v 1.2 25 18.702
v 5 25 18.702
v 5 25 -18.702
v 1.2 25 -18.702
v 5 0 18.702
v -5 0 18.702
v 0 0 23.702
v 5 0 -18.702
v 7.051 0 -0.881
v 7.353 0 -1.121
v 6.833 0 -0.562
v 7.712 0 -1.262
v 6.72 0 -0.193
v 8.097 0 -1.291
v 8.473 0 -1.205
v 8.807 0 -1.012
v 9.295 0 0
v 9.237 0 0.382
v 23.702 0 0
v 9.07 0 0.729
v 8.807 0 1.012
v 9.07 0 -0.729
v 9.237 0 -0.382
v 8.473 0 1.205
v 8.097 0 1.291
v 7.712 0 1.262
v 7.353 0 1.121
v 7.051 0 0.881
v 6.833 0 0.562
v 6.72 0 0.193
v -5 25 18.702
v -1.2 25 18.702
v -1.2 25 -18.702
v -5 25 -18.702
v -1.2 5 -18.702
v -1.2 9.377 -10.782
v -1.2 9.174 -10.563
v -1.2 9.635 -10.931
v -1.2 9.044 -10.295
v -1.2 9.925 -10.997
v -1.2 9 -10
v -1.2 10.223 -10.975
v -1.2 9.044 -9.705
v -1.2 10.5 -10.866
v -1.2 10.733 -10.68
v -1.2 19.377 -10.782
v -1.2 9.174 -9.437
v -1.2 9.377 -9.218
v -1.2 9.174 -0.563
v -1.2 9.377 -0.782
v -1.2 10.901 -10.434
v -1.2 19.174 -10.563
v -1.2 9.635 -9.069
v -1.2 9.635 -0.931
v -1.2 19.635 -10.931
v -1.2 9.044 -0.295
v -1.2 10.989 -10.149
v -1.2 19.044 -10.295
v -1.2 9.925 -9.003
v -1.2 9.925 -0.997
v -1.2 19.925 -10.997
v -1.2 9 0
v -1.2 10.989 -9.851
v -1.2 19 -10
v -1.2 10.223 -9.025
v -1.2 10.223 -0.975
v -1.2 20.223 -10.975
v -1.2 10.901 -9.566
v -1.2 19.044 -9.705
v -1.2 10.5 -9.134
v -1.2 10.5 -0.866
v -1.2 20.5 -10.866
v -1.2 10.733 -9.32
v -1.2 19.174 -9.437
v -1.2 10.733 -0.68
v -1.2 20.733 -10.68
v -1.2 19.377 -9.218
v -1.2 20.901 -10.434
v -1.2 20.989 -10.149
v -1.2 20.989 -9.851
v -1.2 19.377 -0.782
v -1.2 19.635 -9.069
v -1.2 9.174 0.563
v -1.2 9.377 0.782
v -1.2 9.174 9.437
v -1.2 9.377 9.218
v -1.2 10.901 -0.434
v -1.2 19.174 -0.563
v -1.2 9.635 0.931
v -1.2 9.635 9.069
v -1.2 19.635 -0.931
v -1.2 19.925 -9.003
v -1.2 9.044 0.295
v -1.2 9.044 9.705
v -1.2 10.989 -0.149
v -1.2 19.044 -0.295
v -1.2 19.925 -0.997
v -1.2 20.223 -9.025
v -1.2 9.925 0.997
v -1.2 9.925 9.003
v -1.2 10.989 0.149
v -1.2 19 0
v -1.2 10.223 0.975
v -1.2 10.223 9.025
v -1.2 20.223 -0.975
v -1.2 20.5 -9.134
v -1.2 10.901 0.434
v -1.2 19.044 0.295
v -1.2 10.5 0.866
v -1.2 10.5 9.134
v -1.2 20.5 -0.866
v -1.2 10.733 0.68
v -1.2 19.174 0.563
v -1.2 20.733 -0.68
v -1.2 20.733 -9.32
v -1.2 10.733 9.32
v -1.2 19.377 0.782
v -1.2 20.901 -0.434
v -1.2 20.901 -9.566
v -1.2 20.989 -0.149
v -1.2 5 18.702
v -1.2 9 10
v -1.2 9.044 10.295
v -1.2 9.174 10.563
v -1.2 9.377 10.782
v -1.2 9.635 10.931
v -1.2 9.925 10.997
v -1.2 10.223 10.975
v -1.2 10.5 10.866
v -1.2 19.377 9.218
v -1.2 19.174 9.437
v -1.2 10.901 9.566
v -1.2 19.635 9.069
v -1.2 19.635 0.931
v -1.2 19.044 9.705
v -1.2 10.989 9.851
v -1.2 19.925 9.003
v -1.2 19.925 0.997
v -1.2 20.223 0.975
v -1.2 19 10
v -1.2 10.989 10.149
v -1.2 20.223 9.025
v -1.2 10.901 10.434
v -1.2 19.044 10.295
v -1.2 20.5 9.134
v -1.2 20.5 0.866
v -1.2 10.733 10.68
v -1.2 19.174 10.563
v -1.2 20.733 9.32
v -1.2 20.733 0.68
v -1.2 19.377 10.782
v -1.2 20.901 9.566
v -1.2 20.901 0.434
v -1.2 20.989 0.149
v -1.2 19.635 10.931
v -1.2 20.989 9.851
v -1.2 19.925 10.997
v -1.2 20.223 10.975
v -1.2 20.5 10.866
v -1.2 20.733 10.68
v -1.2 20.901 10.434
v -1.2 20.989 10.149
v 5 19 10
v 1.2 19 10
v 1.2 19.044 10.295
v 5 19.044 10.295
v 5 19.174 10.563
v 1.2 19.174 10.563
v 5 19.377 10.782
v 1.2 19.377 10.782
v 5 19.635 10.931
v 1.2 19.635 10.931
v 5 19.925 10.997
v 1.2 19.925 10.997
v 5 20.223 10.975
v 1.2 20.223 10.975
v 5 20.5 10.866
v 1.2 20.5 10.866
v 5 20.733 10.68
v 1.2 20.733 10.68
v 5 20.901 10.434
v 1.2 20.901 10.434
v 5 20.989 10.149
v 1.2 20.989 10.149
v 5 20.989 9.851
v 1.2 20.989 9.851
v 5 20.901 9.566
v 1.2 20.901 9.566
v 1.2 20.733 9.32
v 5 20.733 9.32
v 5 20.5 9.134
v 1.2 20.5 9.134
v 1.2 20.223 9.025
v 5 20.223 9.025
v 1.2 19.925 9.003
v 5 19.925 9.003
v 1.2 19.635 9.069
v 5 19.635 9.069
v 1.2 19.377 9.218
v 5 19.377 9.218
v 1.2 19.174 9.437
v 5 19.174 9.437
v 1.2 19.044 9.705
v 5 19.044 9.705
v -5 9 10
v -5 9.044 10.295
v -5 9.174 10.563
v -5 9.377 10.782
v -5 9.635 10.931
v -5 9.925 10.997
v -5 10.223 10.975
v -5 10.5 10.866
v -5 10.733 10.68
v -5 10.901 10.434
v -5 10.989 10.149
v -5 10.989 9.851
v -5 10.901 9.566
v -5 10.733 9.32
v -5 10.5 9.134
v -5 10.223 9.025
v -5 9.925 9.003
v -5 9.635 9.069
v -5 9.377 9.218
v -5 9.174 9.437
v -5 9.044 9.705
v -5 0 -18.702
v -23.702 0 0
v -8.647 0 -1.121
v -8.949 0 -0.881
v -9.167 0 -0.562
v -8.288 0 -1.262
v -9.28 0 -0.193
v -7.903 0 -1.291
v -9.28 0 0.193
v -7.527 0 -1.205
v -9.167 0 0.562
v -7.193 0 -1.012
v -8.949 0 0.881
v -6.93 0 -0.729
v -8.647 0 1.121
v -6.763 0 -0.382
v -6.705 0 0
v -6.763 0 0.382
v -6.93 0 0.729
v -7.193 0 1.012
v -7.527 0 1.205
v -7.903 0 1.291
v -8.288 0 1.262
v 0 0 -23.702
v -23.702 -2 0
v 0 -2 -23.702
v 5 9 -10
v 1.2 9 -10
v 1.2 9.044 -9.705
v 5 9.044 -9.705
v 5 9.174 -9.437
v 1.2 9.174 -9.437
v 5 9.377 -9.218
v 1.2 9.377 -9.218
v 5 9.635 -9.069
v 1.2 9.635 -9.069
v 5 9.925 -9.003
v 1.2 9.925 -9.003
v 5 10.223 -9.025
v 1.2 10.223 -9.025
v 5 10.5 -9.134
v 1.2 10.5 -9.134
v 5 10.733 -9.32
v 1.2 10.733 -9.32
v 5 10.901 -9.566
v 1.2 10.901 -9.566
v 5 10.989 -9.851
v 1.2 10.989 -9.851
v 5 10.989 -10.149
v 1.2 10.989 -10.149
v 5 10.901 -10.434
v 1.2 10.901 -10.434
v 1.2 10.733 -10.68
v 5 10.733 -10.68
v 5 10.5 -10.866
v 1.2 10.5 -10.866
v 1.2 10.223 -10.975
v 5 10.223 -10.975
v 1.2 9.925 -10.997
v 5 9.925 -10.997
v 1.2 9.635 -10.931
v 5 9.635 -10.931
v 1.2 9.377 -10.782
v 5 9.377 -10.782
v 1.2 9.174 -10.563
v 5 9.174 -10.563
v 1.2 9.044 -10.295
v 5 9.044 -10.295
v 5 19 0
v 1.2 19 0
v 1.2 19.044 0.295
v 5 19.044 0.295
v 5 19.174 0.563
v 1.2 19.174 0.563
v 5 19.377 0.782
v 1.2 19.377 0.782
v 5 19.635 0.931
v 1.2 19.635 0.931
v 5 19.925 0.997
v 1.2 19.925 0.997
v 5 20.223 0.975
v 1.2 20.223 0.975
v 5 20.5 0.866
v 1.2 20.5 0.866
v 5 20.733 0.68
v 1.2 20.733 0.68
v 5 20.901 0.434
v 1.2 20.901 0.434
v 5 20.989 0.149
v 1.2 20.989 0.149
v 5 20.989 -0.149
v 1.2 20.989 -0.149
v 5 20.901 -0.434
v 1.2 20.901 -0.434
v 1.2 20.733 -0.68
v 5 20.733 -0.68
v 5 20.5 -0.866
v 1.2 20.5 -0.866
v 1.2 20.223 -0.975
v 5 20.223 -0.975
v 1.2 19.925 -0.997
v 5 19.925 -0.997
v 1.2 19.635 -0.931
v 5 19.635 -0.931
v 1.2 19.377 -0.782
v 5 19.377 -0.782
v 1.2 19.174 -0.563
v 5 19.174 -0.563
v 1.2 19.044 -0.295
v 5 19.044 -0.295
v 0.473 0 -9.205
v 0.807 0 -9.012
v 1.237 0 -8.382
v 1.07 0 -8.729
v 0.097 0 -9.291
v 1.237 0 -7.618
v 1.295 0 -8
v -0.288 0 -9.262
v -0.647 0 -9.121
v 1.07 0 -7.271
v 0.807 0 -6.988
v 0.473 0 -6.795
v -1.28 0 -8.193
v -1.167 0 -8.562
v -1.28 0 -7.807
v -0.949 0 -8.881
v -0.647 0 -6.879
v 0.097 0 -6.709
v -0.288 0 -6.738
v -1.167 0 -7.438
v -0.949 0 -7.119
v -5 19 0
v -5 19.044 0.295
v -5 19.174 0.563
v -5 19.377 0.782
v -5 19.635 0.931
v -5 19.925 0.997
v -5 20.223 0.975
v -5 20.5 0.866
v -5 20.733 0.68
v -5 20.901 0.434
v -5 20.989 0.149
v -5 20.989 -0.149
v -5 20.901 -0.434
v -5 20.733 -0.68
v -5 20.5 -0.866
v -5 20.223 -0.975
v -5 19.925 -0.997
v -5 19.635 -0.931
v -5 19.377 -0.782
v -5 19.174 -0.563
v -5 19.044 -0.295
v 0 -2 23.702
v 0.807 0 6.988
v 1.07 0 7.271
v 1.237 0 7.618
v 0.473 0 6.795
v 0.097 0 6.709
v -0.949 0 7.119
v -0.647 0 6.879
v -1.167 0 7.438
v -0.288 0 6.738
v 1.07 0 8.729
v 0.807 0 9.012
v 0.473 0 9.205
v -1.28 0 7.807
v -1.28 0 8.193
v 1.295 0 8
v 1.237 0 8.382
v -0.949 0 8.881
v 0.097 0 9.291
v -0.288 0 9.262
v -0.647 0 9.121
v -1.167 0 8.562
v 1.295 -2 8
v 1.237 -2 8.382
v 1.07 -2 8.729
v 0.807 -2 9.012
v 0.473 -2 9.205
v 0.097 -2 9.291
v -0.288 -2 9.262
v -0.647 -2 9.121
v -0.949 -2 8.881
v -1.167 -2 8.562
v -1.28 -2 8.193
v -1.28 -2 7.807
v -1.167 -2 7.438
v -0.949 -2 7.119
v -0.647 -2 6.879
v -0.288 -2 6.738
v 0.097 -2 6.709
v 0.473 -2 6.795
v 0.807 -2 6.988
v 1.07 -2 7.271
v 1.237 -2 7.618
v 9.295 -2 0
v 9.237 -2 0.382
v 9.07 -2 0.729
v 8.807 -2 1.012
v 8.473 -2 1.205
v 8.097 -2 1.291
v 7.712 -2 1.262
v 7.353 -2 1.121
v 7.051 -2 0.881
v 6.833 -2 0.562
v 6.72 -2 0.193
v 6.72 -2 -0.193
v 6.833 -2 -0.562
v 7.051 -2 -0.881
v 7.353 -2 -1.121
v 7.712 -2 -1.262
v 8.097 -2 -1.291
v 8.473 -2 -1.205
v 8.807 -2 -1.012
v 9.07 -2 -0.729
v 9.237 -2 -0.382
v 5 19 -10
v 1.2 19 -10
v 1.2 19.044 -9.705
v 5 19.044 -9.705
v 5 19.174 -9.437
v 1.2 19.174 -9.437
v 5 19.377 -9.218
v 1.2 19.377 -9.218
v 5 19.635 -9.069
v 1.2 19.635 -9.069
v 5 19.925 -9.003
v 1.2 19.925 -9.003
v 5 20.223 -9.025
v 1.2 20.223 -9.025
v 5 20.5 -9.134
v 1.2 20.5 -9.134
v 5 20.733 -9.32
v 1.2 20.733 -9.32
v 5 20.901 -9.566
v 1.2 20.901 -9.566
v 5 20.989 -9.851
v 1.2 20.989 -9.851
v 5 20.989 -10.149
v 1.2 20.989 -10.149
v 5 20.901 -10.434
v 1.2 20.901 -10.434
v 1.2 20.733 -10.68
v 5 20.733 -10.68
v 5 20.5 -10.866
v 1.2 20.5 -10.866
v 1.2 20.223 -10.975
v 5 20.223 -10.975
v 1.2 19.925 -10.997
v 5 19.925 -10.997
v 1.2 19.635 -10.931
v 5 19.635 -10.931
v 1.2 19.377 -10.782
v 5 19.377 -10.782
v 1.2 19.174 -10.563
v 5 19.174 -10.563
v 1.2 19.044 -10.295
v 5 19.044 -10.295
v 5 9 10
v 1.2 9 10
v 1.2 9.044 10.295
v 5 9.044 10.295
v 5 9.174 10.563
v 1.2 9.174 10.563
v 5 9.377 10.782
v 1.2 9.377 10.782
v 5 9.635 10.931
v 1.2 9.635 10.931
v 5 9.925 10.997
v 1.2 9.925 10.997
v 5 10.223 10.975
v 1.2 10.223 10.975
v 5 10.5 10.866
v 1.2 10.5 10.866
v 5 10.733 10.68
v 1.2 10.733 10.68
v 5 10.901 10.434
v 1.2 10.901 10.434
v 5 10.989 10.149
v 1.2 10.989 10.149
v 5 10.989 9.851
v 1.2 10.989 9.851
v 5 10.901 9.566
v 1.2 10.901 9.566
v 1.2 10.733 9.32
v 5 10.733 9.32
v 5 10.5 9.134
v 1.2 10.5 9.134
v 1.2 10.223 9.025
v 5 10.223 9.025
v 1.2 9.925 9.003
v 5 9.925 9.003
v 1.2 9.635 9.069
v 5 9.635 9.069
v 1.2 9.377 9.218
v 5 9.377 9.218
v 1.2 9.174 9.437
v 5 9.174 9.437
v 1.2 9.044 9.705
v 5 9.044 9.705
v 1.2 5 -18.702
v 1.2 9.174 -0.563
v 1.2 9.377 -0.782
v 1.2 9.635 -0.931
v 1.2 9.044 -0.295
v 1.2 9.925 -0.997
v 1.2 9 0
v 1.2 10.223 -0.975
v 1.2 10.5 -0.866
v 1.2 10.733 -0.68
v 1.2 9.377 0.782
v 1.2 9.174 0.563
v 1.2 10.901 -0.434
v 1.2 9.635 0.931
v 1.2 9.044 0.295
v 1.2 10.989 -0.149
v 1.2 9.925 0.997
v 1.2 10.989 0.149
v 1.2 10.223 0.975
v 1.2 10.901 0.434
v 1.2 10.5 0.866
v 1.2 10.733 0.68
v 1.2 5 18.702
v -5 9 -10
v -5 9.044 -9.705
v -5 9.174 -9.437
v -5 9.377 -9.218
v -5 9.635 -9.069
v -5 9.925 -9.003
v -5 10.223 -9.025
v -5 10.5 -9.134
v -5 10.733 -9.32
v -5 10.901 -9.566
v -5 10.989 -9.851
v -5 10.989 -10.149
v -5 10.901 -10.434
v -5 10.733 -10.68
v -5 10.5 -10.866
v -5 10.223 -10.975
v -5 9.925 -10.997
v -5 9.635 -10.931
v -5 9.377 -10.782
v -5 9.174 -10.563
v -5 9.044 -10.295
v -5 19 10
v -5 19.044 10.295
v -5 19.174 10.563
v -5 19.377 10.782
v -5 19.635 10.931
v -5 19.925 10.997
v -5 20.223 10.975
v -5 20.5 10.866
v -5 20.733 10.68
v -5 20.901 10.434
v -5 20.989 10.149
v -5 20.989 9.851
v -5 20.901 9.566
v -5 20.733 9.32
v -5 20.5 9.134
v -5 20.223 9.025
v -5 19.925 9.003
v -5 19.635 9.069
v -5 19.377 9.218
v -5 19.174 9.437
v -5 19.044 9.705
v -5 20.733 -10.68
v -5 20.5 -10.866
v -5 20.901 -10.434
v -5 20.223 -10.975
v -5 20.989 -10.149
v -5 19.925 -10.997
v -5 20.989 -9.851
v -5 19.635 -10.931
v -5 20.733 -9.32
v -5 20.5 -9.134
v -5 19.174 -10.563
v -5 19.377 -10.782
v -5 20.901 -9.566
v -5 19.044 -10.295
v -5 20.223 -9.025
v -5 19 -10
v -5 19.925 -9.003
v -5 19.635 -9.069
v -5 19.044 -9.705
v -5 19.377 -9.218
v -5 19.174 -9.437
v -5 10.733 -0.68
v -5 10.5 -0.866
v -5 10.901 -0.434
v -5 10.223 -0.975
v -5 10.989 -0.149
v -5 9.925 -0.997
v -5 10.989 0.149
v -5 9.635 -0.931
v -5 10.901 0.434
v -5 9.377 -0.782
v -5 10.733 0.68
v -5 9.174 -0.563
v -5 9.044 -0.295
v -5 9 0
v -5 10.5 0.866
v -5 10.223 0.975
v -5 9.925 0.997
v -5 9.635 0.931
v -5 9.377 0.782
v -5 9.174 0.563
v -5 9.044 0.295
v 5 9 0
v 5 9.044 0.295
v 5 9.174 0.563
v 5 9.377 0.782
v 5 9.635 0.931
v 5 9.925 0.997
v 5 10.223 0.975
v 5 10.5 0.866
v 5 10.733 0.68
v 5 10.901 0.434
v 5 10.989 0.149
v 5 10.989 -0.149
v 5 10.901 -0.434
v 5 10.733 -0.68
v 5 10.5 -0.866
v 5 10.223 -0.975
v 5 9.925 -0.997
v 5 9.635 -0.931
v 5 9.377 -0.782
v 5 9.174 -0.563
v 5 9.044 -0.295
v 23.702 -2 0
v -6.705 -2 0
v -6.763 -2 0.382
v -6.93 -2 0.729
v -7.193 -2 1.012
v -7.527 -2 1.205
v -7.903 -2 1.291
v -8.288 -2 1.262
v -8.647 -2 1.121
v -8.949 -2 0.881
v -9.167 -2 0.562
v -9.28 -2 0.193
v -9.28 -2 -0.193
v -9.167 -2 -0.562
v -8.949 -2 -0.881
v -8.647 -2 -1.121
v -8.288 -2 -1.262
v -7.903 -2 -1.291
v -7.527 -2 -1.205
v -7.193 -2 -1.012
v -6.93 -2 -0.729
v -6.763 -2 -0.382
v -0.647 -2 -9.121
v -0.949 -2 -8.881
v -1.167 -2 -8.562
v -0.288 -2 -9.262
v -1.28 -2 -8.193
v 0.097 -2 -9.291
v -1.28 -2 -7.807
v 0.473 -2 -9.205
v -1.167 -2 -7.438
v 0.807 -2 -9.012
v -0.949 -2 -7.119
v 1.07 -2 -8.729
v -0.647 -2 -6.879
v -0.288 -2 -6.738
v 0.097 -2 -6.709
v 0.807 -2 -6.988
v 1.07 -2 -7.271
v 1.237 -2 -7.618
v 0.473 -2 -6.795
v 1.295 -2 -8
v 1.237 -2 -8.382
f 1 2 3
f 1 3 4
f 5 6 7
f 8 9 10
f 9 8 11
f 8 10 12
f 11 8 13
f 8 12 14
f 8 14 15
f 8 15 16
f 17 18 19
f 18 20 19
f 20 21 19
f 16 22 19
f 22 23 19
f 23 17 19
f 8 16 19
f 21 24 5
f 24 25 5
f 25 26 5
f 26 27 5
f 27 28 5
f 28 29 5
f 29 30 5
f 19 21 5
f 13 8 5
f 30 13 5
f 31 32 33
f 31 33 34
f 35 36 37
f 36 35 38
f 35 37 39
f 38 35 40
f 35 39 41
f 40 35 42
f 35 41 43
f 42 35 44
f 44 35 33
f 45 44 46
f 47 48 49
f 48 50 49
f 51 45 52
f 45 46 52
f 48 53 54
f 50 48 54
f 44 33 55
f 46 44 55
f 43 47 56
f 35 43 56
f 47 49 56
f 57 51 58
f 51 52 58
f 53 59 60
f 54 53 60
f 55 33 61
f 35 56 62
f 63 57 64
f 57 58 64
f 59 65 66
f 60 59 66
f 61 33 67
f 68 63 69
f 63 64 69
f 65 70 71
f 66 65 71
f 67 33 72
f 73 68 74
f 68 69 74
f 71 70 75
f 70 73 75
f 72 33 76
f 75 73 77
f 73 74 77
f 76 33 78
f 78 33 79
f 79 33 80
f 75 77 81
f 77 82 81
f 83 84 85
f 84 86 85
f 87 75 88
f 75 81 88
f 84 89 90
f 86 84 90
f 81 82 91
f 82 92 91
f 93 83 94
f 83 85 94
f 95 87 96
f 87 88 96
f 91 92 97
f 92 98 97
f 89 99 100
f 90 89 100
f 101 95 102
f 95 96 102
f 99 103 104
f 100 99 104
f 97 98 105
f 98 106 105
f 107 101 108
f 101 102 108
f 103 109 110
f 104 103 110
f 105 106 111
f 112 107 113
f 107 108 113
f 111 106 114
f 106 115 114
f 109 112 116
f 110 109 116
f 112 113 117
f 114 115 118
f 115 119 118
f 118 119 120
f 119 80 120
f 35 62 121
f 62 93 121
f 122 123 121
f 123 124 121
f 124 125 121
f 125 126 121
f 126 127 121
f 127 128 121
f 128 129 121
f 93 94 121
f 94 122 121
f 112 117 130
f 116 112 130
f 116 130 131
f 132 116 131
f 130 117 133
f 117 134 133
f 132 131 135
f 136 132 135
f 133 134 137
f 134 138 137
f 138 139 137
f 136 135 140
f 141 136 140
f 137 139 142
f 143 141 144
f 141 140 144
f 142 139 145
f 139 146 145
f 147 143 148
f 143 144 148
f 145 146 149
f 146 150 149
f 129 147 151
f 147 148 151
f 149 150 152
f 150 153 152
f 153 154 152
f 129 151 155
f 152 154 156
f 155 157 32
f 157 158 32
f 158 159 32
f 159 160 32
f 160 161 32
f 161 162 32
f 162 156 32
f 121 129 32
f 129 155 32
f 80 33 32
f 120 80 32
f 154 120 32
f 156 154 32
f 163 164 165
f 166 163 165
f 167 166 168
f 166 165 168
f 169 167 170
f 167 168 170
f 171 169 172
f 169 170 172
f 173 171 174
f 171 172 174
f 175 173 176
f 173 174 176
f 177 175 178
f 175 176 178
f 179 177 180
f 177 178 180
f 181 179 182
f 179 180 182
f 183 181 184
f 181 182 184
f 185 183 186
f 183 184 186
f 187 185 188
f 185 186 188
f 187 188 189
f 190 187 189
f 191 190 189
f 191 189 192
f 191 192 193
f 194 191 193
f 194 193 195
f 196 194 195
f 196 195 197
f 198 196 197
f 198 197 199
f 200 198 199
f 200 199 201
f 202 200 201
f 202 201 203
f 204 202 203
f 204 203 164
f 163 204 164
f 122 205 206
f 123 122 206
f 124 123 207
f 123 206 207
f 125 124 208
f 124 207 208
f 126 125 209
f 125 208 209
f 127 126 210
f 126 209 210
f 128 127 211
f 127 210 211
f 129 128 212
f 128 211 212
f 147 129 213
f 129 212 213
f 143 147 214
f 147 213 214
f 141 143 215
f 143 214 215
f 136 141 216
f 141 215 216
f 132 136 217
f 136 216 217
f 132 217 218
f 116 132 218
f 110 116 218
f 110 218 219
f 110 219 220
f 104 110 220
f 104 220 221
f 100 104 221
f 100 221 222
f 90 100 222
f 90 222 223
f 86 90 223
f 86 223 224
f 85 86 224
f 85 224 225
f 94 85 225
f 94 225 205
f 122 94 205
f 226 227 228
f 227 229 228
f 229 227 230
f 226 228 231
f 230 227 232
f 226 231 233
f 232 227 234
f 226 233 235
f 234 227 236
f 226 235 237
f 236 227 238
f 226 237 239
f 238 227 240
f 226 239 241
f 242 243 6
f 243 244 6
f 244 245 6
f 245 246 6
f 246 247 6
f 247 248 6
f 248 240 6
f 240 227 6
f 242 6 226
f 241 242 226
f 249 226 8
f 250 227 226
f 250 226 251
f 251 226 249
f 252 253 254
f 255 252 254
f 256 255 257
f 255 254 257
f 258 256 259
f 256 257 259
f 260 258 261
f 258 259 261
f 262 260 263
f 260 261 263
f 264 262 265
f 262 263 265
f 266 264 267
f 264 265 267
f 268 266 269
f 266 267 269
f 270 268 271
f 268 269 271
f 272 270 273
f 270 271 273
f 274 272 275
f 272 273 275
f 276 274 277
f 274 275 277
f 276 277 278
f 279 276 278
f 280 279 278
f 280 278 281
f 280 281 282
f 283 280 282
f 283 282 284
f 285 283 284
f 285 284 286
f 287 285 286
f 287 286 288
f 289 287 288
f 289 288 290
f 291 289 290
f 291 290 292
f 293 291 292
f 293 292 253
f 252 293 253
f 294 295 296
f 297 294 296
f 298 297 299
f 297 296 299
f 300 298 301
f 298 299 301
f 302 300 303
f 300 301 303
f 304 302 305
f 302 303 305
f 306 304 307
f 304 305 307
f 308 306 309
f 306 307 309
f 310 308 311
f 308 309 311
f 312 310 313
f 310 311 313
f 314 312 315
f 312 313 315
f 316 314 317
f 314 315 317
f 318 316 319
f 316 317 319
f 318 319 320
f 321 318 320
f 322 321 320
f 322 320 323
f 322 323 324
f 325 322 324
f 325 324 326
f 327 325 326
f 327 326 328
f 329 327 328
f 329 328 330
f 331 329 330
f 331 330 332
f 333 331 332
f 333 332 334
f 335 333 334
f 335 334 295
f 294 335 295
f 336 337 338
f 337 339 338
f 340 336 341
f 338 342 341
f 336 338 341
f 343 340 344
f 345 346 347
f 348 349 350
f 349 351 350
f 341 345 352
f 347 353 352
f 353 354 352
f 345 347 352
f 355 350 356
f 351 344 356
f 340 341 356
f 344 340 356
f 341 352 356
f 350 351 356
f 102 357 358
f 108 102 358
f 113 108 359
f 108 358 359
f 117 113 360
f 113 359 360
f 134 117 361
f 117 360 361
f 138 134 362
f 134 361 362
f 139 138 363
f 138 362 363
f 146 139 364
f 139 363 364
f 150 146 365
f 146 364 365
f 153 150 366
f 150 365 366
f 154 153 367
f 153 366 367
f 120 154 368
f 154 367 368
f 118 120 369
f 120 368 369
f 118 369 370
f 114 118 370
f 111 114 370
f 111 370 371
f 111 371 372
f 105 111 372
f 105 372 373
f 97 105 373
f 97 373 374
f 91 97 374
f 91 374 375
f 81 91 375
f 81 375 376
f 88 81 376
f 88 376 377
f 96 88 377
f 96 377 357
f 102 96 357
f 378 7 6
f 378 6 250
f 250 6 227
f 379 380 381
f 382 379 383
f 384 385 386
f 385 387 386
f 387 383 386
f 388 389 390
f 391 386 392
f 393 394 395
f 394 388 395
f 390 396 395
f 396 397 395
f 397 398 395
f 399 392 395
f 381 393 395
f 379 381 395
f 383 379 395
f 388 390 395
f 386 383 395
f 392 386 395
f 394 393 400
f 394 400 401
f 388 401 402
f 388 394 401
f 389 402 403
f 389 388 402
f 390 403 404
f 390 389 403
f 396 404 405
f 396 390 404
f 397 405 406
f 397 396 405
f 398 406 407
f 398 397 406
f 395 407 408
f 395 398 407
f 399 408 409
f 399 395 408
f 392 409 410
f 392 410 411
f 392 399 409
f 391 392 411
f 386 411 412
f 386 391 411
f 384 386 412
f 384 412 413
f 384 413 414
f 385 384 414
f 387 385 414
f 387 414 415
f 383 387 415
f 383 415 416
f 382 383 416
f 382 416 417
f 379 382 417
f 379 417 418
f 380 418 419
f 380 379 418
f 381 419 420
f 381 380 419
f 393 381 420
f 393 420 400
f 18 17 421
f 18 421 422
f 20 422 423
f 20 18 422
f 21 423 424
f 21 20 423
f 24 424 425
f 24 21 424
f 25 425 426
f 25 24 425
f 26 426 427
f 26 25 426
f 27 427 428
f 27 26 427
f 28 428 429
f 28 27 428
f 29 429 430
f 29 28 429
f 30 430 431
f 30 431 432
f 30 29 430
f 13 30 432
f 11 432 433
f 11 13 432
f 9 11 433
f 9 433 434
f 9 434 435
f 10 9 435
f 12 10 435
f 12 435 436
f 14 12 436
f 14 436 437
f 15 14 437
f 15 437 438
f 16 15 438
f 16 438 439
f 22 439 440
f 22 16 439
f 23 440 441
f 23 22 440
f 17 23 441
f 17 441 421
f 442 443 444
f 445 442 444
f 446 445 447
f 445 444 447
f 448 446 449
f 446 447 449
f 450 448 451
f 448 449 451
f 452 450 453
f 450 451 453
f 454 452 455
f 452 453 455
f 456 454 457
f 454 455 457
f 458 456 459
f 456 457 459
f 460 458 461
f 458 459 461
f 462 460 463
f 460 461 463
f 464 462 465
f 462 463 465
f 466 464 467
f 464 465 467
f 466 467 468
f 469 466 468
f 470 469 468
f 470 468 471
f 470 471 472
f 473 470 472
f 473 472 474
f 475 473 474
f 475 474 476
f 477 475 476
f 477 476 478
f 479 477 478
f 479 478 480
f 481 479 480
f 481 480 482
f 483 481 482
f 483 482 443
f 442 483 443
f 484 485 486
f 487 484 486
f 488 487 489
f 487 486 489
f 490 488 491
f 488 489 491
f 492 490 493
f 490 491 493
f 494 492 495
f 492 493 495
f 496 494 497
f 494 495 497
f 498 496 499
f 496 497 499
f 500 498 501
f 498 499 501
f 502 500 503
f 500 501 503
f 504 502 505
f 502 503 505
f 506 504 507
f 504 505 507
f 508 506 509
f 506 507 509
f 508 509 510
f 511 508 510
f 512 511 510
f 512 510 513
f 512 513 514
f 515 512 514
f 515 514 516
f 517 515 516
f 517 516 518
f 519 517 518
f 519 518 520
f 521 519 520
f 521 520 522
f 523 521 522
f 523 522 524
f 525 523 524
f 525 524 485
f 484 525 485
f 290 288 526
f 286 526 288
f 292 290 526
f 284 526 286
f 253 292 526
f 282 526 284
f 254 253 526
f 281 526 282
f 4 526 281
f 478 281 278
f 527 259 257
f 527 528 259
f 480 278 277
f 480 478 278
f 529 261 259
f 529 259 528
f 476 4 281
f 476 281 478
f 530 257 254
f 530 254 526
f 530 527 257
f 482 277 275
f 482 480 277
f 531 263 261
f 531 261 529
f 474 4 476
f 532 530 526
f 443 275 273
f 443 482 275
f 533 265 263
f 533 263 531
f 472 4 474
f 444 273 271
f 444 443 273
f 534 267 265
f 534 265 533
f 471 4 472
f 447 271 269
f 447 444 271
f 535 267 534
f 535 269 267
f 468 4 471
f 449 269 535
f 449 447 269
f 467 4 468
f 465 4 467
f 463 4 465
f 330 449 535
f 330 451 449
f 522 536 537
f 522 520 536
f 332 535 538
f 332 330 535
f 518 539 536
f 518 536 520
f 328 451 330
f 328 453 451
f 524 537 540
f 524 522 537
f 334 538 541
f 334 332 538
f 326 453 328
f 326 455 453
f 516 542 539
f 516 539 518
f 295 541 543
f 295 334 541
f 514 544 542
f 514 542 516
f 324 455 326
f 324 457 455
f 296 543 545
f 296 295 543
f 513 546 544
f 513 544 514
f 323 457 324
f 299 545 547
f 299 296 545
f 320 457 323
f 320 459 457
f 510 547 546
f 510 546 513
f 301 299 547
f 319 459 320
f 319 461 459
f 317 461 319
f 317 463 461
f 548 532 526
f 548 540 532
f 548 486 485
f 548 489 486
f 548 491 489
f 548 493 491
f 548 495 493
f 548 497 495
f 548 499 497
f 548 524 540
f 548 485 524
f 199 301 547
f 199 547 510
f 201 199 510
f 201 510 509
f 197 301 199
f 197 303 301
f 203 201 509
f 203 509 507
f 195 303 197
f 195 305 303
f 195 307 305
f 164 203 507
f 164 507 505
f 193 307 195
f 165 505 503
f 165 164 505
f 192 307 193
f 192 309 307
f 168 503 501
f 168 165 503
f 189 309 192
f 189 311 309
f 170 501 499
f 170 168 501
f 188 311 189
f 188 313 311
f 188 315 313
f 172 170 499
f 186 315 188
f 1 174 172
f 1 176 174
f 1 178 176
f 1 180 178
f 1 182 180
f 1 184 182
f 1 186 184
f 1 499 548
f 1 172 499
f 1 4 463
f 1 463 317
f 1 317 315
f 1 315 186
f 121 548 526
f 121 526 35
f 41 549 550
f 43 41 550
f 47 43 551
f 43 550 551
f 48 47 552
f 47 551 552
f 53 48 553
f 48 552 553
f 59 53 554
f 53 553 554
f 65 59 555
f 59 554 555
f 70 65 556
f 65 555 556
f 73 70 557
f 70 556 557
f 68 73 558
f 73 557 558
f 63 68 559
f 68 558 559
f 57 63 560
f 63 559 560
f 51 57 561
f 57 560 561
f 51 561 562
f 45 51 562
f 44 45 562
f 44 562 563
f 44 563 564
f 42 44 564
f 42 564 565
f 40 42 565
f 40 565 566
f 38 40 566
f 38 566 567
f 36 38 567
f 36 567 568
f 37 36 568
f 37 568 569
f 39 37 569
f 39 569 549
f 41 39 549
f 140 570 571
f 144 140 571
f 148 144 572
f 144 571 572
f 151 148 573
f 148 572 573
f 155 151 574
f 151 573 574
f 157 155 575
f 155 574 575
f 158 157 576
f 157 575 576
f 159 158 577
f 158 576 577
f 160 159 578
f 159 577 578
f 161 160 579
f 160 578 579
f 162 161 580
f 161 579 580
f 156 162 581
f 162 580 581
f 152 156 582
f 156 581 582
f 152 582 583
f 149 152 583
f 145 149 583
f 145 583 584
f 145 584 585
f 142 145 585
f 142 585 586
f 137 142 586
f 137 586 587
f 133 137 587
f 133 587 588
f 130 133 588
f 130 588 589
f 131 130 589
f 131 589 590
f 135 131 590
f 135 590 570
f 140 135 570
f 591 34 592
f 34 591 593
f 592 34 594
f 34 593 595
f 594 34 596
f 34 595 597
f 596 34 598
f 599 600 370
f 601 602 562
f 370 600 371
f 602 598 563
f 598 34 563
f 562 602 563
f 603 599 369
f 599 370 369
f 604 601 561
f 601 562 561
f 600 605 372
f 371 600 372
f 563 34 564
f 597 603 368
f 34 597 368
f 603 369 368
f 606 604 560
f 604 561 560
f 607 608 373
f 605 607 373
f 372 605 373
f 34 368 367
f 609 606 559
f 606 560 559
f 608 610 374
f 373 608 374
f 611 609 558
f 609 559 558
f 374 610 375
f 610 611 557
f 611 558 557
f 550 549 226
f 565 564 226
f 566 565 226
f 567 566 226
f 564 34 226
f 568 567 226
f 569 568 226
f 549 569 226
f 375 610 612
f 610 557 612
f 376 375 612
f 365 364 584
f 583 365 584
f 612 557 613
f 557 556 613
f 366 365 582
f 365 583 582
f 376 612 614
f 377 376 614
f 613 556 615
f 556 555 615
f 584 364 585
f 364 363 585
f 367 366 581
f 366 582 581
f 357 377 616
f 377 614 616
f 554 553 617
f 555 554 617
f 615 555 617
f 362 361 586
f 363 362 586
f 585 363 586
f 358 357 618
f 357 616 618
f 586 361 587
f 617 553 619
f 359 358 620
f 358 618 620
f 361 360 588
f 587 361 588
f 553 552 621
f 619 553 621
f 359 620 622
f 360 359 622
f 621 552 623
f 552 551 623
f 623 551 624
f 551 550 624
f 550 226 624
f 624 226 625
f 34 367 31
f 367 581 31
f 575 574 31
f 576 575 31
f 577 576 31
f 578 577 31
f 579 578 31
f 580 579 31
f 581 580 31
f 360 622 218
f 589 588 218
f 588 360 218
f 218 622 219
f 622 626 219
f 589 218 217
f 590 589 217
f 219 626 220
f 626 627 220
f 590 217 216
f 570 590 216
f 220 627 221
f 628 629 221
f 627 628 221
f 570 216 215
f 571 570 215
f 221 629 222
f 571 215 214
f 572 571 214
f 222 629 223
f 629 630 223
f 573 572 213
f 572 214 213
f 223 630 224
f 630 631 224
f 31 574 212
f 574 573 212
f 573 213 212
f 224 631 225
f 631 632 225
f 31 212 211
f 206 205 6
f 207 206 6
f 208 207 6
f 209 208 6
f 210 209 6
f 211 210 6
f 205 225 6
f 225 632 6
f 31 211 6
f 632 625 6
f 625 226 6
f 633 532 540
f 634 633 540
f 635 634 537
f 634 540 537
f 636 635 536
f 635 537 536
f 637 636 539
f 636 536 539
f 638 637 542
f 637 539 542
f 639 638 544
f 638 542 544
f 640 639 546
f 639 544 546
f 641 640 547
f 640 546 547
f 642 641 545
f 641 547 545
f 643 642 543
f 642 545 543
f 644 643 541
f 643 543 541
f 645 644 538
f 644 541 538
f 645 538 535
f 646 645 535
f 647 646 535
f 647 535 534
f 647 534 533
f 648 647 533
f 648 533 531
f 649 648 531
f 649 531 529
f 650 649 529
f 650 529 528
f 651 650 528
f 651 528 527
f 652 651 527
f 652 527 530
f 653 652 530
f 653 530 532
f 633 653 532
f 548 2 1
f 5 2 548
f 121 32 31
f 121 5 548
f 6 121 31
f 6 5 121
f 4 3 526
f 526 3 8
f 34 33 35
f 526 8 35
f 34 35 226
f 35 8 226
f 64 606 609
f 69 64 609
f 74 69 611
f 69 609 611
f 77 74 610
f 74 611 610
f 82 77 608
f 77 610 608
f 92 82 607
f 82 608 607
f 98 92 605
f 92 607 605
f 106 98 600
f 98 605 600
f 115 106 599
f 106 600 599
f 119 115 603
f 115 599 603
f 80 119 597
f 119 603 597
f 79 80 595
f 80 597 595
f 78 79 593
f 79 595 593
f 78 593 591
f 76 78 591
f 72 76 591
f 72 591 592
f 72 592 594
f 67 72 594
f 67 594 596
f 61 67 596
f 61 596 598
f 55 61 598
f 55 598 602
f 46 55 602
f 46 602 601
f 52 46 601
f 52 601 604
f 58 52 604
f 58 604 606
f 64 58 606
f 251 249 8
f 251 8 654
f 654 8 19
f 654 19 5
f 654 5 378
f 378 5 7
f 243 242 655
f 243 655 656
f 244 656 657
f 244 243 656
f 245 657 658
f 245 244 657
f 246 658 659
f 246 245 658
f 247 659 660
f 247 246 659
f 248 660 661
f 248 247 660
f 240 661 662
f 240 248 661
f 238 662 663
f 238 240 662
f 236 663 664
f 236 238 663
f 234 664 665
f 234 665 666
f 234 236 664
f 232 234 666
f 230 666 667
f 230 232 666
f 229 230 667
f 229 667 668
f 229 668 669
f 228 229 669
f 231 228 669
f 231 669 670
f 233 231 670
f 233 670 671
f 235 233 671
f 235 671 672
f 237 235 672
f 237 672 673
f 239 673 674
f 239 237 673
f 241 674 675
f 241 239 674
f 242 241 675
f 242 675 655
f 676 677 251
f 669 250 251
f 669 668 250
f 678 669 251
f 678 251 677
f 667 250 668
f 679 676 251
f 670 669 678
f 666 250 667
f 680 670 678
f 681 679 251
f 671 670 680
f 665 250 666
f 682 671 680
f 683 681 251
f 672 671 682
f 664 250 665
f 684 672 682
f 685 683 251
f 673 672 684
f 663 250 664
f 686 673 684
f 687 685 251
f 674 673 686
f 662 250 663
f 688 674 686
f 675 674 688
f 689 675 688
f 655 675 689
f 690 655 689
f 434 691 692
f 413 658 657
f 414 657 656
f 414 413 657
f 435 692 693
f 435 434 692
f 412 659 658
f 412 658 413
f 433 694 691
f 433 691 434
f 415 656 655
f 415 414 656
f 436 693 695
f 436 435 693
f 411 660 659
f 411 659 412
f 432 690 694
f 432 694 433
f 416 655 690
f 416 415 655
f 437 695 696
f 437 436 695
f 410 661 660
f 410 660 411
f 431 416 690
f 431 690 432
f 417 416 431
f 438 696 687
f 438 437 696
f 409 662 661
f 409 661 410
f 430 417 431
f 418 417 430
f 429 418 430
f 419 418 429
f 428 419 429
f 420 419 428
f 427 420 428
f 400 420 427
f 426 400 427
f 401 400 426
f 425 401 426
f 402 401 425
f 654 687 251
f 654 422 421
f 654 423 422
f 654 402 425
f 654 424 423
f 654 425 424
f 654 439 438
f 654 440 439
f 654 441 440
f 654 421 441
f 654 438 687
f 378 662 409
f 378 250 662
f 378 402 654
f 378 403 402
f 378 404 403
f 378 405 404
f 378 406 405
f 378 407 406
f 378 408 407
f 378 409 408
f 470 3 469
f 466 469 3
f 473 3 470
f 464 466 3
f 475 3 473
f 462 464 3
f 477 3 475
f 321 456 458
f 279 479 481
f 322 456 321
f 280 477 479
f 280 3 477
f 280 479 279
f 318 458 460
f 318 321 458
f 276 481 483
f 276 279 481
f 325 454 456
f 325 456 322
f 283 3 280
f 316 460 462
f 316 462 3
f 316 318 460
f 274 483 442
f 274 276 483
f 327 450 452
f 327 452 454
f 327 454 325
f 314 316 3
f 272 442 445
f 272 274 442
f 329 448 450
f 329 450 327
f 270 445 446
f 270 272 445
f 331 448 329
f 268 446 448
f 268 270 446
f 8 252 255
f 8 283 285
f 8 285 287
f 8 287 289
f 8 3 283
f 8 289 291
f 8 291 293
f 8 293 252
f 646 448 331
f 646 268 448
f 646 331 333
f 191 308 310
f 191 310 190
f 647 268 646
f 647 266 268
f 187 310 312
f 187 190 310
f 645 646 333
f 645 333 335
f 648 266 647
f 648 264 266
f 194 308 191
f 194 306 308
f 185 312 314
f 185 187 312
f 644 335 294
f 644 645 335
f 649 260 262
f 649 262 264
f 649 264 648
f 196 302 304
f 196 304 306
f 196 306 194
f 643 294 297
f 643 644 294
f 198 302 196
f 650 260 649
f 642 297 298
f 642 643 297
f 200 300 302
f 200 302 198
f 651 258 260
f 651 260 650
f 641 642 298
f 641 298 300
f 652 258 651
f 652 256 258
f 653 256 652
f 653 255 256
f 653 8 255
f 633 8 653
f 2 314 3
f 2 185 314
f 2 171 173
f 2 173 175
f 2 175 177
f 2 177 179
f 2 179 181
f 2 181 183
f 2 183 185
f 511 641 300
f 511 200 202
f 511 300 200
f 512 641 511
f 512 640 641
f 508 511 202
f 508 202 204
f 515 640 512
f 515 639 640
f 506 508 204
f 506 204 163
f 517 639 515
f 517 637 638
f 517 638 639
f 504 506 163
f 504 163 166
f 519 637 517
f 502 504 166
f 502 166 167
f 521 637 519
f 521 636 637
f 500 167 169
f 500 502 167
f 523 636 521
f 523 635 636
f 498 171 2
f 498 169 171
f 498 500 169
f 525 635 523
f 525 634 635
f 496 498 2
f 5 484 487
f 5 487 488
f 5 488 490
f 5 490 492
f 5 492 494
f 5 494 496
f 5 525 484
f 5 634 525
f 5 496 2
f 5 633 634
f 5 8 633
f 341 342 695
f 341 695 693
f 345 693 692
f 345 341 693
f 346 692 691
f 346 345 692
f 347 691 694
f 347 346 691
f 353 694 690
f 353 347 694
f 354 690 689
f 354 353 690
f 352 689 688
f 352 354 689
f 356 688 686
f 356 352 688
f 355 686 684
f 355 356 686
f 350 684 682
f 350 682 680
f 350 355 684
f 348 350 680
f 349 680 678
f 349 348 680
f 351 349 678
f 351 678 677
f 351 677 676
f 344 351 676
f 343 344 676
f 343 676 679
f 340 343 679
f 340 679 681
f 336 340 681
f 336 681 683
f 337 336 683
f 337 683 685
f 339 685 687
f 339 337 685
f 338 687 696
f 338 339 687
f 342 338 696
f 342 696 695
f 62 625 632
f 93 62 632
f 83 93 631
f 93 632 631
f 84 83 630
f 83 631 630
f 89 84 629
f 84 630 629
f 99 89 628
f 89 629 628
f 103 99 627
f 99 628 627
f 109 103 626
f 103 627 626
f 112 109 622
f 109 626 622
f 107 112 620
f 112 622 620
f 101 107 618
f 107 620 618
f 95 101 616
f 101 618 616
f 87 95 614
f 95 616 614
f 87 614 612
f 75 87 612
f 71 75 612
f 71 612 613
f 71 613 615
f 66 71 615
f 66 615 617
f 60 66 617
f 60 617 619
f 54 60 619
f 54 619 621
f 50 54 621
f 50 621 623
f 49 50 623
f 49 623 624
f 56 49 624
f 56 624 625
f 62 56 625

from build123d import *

# Parameters (mm, degrees)
F0_R     = 1.294923
F1_DEPTH = 2
F2_W     = 10
F2_H     = 37.403586
F3_DEPTH = 25
F4_W     = 2.4
F4_H     = 37.403586
F5_DEPTH = 20
F6_R     = 1
F7_DEPTH = 25


with BuildPart() as f1:
    # F0 (on Front) → F1 (new body)
    with BuildSketch(Plane.XZ):
        Polygon((23.701793, 0), (0, 23.701793), (-23.701793, 0), (0, -23.701793), align=None)
        with Locations((0, -8)):
            Circle(F0_R, mode=Mode.SUBTRACT)
        with Locations((-8, 0)):
            Circle(F0_R, mode=Mode.SUBTRACT)
        with Locations((8, 0)):
            Circle(F0_R, mode=Mode.SUBTRACT)
        with Locations((0, 8)):
            Circle(F0_R, mode=Mode.SUBTRACT)
    extrude(amount=F1_DEPTH)

    # F2 (on face) → F3 (join)
    with BuildSketch(Plane(origin=(0, 0, 0), x_dir=(-1, 0, 0), z_dir=(0, 1, 0))):
        Rectangle(F2_W, F2_H)
    extrude(amount=F3_DEPTH)

    # F4 (on face) → F5 (cut)
    with BuildSketch(Plane(origin=(0, 25, 0), x_dir=(-1, 0, 0), z_dir=(0, 1, 0))):
        Rectangle(F4_W, F4_H)
    extrude(amount=-F5_DEPTH, mode=Mode.SUBTRACT)

    # F6 (on face) → F7 (cut)
    with BuildSketch(Plane(origin=(-5, 0, 0), x_dir=(0, -1, 0), z_dir=(-1, 0, 0))):
        with Locations((-20, 10)):
            Circle(F6_R)
        with Locations((-10, 10)):
            Circle(F6_R)
        with Locations((-10, 0)):
            Circle(F6_R)
        with Locations((-20, 0)):
            Circle(F6_R)
        with Locations((-20, -10)):
            Circle(F6_R)
        with Locations((-10, -10)):
            Circle(F6_R)
    extrude(amount=-F7_DEPTH, mode=Mode.SUBTRACT)


solid = f1.part
